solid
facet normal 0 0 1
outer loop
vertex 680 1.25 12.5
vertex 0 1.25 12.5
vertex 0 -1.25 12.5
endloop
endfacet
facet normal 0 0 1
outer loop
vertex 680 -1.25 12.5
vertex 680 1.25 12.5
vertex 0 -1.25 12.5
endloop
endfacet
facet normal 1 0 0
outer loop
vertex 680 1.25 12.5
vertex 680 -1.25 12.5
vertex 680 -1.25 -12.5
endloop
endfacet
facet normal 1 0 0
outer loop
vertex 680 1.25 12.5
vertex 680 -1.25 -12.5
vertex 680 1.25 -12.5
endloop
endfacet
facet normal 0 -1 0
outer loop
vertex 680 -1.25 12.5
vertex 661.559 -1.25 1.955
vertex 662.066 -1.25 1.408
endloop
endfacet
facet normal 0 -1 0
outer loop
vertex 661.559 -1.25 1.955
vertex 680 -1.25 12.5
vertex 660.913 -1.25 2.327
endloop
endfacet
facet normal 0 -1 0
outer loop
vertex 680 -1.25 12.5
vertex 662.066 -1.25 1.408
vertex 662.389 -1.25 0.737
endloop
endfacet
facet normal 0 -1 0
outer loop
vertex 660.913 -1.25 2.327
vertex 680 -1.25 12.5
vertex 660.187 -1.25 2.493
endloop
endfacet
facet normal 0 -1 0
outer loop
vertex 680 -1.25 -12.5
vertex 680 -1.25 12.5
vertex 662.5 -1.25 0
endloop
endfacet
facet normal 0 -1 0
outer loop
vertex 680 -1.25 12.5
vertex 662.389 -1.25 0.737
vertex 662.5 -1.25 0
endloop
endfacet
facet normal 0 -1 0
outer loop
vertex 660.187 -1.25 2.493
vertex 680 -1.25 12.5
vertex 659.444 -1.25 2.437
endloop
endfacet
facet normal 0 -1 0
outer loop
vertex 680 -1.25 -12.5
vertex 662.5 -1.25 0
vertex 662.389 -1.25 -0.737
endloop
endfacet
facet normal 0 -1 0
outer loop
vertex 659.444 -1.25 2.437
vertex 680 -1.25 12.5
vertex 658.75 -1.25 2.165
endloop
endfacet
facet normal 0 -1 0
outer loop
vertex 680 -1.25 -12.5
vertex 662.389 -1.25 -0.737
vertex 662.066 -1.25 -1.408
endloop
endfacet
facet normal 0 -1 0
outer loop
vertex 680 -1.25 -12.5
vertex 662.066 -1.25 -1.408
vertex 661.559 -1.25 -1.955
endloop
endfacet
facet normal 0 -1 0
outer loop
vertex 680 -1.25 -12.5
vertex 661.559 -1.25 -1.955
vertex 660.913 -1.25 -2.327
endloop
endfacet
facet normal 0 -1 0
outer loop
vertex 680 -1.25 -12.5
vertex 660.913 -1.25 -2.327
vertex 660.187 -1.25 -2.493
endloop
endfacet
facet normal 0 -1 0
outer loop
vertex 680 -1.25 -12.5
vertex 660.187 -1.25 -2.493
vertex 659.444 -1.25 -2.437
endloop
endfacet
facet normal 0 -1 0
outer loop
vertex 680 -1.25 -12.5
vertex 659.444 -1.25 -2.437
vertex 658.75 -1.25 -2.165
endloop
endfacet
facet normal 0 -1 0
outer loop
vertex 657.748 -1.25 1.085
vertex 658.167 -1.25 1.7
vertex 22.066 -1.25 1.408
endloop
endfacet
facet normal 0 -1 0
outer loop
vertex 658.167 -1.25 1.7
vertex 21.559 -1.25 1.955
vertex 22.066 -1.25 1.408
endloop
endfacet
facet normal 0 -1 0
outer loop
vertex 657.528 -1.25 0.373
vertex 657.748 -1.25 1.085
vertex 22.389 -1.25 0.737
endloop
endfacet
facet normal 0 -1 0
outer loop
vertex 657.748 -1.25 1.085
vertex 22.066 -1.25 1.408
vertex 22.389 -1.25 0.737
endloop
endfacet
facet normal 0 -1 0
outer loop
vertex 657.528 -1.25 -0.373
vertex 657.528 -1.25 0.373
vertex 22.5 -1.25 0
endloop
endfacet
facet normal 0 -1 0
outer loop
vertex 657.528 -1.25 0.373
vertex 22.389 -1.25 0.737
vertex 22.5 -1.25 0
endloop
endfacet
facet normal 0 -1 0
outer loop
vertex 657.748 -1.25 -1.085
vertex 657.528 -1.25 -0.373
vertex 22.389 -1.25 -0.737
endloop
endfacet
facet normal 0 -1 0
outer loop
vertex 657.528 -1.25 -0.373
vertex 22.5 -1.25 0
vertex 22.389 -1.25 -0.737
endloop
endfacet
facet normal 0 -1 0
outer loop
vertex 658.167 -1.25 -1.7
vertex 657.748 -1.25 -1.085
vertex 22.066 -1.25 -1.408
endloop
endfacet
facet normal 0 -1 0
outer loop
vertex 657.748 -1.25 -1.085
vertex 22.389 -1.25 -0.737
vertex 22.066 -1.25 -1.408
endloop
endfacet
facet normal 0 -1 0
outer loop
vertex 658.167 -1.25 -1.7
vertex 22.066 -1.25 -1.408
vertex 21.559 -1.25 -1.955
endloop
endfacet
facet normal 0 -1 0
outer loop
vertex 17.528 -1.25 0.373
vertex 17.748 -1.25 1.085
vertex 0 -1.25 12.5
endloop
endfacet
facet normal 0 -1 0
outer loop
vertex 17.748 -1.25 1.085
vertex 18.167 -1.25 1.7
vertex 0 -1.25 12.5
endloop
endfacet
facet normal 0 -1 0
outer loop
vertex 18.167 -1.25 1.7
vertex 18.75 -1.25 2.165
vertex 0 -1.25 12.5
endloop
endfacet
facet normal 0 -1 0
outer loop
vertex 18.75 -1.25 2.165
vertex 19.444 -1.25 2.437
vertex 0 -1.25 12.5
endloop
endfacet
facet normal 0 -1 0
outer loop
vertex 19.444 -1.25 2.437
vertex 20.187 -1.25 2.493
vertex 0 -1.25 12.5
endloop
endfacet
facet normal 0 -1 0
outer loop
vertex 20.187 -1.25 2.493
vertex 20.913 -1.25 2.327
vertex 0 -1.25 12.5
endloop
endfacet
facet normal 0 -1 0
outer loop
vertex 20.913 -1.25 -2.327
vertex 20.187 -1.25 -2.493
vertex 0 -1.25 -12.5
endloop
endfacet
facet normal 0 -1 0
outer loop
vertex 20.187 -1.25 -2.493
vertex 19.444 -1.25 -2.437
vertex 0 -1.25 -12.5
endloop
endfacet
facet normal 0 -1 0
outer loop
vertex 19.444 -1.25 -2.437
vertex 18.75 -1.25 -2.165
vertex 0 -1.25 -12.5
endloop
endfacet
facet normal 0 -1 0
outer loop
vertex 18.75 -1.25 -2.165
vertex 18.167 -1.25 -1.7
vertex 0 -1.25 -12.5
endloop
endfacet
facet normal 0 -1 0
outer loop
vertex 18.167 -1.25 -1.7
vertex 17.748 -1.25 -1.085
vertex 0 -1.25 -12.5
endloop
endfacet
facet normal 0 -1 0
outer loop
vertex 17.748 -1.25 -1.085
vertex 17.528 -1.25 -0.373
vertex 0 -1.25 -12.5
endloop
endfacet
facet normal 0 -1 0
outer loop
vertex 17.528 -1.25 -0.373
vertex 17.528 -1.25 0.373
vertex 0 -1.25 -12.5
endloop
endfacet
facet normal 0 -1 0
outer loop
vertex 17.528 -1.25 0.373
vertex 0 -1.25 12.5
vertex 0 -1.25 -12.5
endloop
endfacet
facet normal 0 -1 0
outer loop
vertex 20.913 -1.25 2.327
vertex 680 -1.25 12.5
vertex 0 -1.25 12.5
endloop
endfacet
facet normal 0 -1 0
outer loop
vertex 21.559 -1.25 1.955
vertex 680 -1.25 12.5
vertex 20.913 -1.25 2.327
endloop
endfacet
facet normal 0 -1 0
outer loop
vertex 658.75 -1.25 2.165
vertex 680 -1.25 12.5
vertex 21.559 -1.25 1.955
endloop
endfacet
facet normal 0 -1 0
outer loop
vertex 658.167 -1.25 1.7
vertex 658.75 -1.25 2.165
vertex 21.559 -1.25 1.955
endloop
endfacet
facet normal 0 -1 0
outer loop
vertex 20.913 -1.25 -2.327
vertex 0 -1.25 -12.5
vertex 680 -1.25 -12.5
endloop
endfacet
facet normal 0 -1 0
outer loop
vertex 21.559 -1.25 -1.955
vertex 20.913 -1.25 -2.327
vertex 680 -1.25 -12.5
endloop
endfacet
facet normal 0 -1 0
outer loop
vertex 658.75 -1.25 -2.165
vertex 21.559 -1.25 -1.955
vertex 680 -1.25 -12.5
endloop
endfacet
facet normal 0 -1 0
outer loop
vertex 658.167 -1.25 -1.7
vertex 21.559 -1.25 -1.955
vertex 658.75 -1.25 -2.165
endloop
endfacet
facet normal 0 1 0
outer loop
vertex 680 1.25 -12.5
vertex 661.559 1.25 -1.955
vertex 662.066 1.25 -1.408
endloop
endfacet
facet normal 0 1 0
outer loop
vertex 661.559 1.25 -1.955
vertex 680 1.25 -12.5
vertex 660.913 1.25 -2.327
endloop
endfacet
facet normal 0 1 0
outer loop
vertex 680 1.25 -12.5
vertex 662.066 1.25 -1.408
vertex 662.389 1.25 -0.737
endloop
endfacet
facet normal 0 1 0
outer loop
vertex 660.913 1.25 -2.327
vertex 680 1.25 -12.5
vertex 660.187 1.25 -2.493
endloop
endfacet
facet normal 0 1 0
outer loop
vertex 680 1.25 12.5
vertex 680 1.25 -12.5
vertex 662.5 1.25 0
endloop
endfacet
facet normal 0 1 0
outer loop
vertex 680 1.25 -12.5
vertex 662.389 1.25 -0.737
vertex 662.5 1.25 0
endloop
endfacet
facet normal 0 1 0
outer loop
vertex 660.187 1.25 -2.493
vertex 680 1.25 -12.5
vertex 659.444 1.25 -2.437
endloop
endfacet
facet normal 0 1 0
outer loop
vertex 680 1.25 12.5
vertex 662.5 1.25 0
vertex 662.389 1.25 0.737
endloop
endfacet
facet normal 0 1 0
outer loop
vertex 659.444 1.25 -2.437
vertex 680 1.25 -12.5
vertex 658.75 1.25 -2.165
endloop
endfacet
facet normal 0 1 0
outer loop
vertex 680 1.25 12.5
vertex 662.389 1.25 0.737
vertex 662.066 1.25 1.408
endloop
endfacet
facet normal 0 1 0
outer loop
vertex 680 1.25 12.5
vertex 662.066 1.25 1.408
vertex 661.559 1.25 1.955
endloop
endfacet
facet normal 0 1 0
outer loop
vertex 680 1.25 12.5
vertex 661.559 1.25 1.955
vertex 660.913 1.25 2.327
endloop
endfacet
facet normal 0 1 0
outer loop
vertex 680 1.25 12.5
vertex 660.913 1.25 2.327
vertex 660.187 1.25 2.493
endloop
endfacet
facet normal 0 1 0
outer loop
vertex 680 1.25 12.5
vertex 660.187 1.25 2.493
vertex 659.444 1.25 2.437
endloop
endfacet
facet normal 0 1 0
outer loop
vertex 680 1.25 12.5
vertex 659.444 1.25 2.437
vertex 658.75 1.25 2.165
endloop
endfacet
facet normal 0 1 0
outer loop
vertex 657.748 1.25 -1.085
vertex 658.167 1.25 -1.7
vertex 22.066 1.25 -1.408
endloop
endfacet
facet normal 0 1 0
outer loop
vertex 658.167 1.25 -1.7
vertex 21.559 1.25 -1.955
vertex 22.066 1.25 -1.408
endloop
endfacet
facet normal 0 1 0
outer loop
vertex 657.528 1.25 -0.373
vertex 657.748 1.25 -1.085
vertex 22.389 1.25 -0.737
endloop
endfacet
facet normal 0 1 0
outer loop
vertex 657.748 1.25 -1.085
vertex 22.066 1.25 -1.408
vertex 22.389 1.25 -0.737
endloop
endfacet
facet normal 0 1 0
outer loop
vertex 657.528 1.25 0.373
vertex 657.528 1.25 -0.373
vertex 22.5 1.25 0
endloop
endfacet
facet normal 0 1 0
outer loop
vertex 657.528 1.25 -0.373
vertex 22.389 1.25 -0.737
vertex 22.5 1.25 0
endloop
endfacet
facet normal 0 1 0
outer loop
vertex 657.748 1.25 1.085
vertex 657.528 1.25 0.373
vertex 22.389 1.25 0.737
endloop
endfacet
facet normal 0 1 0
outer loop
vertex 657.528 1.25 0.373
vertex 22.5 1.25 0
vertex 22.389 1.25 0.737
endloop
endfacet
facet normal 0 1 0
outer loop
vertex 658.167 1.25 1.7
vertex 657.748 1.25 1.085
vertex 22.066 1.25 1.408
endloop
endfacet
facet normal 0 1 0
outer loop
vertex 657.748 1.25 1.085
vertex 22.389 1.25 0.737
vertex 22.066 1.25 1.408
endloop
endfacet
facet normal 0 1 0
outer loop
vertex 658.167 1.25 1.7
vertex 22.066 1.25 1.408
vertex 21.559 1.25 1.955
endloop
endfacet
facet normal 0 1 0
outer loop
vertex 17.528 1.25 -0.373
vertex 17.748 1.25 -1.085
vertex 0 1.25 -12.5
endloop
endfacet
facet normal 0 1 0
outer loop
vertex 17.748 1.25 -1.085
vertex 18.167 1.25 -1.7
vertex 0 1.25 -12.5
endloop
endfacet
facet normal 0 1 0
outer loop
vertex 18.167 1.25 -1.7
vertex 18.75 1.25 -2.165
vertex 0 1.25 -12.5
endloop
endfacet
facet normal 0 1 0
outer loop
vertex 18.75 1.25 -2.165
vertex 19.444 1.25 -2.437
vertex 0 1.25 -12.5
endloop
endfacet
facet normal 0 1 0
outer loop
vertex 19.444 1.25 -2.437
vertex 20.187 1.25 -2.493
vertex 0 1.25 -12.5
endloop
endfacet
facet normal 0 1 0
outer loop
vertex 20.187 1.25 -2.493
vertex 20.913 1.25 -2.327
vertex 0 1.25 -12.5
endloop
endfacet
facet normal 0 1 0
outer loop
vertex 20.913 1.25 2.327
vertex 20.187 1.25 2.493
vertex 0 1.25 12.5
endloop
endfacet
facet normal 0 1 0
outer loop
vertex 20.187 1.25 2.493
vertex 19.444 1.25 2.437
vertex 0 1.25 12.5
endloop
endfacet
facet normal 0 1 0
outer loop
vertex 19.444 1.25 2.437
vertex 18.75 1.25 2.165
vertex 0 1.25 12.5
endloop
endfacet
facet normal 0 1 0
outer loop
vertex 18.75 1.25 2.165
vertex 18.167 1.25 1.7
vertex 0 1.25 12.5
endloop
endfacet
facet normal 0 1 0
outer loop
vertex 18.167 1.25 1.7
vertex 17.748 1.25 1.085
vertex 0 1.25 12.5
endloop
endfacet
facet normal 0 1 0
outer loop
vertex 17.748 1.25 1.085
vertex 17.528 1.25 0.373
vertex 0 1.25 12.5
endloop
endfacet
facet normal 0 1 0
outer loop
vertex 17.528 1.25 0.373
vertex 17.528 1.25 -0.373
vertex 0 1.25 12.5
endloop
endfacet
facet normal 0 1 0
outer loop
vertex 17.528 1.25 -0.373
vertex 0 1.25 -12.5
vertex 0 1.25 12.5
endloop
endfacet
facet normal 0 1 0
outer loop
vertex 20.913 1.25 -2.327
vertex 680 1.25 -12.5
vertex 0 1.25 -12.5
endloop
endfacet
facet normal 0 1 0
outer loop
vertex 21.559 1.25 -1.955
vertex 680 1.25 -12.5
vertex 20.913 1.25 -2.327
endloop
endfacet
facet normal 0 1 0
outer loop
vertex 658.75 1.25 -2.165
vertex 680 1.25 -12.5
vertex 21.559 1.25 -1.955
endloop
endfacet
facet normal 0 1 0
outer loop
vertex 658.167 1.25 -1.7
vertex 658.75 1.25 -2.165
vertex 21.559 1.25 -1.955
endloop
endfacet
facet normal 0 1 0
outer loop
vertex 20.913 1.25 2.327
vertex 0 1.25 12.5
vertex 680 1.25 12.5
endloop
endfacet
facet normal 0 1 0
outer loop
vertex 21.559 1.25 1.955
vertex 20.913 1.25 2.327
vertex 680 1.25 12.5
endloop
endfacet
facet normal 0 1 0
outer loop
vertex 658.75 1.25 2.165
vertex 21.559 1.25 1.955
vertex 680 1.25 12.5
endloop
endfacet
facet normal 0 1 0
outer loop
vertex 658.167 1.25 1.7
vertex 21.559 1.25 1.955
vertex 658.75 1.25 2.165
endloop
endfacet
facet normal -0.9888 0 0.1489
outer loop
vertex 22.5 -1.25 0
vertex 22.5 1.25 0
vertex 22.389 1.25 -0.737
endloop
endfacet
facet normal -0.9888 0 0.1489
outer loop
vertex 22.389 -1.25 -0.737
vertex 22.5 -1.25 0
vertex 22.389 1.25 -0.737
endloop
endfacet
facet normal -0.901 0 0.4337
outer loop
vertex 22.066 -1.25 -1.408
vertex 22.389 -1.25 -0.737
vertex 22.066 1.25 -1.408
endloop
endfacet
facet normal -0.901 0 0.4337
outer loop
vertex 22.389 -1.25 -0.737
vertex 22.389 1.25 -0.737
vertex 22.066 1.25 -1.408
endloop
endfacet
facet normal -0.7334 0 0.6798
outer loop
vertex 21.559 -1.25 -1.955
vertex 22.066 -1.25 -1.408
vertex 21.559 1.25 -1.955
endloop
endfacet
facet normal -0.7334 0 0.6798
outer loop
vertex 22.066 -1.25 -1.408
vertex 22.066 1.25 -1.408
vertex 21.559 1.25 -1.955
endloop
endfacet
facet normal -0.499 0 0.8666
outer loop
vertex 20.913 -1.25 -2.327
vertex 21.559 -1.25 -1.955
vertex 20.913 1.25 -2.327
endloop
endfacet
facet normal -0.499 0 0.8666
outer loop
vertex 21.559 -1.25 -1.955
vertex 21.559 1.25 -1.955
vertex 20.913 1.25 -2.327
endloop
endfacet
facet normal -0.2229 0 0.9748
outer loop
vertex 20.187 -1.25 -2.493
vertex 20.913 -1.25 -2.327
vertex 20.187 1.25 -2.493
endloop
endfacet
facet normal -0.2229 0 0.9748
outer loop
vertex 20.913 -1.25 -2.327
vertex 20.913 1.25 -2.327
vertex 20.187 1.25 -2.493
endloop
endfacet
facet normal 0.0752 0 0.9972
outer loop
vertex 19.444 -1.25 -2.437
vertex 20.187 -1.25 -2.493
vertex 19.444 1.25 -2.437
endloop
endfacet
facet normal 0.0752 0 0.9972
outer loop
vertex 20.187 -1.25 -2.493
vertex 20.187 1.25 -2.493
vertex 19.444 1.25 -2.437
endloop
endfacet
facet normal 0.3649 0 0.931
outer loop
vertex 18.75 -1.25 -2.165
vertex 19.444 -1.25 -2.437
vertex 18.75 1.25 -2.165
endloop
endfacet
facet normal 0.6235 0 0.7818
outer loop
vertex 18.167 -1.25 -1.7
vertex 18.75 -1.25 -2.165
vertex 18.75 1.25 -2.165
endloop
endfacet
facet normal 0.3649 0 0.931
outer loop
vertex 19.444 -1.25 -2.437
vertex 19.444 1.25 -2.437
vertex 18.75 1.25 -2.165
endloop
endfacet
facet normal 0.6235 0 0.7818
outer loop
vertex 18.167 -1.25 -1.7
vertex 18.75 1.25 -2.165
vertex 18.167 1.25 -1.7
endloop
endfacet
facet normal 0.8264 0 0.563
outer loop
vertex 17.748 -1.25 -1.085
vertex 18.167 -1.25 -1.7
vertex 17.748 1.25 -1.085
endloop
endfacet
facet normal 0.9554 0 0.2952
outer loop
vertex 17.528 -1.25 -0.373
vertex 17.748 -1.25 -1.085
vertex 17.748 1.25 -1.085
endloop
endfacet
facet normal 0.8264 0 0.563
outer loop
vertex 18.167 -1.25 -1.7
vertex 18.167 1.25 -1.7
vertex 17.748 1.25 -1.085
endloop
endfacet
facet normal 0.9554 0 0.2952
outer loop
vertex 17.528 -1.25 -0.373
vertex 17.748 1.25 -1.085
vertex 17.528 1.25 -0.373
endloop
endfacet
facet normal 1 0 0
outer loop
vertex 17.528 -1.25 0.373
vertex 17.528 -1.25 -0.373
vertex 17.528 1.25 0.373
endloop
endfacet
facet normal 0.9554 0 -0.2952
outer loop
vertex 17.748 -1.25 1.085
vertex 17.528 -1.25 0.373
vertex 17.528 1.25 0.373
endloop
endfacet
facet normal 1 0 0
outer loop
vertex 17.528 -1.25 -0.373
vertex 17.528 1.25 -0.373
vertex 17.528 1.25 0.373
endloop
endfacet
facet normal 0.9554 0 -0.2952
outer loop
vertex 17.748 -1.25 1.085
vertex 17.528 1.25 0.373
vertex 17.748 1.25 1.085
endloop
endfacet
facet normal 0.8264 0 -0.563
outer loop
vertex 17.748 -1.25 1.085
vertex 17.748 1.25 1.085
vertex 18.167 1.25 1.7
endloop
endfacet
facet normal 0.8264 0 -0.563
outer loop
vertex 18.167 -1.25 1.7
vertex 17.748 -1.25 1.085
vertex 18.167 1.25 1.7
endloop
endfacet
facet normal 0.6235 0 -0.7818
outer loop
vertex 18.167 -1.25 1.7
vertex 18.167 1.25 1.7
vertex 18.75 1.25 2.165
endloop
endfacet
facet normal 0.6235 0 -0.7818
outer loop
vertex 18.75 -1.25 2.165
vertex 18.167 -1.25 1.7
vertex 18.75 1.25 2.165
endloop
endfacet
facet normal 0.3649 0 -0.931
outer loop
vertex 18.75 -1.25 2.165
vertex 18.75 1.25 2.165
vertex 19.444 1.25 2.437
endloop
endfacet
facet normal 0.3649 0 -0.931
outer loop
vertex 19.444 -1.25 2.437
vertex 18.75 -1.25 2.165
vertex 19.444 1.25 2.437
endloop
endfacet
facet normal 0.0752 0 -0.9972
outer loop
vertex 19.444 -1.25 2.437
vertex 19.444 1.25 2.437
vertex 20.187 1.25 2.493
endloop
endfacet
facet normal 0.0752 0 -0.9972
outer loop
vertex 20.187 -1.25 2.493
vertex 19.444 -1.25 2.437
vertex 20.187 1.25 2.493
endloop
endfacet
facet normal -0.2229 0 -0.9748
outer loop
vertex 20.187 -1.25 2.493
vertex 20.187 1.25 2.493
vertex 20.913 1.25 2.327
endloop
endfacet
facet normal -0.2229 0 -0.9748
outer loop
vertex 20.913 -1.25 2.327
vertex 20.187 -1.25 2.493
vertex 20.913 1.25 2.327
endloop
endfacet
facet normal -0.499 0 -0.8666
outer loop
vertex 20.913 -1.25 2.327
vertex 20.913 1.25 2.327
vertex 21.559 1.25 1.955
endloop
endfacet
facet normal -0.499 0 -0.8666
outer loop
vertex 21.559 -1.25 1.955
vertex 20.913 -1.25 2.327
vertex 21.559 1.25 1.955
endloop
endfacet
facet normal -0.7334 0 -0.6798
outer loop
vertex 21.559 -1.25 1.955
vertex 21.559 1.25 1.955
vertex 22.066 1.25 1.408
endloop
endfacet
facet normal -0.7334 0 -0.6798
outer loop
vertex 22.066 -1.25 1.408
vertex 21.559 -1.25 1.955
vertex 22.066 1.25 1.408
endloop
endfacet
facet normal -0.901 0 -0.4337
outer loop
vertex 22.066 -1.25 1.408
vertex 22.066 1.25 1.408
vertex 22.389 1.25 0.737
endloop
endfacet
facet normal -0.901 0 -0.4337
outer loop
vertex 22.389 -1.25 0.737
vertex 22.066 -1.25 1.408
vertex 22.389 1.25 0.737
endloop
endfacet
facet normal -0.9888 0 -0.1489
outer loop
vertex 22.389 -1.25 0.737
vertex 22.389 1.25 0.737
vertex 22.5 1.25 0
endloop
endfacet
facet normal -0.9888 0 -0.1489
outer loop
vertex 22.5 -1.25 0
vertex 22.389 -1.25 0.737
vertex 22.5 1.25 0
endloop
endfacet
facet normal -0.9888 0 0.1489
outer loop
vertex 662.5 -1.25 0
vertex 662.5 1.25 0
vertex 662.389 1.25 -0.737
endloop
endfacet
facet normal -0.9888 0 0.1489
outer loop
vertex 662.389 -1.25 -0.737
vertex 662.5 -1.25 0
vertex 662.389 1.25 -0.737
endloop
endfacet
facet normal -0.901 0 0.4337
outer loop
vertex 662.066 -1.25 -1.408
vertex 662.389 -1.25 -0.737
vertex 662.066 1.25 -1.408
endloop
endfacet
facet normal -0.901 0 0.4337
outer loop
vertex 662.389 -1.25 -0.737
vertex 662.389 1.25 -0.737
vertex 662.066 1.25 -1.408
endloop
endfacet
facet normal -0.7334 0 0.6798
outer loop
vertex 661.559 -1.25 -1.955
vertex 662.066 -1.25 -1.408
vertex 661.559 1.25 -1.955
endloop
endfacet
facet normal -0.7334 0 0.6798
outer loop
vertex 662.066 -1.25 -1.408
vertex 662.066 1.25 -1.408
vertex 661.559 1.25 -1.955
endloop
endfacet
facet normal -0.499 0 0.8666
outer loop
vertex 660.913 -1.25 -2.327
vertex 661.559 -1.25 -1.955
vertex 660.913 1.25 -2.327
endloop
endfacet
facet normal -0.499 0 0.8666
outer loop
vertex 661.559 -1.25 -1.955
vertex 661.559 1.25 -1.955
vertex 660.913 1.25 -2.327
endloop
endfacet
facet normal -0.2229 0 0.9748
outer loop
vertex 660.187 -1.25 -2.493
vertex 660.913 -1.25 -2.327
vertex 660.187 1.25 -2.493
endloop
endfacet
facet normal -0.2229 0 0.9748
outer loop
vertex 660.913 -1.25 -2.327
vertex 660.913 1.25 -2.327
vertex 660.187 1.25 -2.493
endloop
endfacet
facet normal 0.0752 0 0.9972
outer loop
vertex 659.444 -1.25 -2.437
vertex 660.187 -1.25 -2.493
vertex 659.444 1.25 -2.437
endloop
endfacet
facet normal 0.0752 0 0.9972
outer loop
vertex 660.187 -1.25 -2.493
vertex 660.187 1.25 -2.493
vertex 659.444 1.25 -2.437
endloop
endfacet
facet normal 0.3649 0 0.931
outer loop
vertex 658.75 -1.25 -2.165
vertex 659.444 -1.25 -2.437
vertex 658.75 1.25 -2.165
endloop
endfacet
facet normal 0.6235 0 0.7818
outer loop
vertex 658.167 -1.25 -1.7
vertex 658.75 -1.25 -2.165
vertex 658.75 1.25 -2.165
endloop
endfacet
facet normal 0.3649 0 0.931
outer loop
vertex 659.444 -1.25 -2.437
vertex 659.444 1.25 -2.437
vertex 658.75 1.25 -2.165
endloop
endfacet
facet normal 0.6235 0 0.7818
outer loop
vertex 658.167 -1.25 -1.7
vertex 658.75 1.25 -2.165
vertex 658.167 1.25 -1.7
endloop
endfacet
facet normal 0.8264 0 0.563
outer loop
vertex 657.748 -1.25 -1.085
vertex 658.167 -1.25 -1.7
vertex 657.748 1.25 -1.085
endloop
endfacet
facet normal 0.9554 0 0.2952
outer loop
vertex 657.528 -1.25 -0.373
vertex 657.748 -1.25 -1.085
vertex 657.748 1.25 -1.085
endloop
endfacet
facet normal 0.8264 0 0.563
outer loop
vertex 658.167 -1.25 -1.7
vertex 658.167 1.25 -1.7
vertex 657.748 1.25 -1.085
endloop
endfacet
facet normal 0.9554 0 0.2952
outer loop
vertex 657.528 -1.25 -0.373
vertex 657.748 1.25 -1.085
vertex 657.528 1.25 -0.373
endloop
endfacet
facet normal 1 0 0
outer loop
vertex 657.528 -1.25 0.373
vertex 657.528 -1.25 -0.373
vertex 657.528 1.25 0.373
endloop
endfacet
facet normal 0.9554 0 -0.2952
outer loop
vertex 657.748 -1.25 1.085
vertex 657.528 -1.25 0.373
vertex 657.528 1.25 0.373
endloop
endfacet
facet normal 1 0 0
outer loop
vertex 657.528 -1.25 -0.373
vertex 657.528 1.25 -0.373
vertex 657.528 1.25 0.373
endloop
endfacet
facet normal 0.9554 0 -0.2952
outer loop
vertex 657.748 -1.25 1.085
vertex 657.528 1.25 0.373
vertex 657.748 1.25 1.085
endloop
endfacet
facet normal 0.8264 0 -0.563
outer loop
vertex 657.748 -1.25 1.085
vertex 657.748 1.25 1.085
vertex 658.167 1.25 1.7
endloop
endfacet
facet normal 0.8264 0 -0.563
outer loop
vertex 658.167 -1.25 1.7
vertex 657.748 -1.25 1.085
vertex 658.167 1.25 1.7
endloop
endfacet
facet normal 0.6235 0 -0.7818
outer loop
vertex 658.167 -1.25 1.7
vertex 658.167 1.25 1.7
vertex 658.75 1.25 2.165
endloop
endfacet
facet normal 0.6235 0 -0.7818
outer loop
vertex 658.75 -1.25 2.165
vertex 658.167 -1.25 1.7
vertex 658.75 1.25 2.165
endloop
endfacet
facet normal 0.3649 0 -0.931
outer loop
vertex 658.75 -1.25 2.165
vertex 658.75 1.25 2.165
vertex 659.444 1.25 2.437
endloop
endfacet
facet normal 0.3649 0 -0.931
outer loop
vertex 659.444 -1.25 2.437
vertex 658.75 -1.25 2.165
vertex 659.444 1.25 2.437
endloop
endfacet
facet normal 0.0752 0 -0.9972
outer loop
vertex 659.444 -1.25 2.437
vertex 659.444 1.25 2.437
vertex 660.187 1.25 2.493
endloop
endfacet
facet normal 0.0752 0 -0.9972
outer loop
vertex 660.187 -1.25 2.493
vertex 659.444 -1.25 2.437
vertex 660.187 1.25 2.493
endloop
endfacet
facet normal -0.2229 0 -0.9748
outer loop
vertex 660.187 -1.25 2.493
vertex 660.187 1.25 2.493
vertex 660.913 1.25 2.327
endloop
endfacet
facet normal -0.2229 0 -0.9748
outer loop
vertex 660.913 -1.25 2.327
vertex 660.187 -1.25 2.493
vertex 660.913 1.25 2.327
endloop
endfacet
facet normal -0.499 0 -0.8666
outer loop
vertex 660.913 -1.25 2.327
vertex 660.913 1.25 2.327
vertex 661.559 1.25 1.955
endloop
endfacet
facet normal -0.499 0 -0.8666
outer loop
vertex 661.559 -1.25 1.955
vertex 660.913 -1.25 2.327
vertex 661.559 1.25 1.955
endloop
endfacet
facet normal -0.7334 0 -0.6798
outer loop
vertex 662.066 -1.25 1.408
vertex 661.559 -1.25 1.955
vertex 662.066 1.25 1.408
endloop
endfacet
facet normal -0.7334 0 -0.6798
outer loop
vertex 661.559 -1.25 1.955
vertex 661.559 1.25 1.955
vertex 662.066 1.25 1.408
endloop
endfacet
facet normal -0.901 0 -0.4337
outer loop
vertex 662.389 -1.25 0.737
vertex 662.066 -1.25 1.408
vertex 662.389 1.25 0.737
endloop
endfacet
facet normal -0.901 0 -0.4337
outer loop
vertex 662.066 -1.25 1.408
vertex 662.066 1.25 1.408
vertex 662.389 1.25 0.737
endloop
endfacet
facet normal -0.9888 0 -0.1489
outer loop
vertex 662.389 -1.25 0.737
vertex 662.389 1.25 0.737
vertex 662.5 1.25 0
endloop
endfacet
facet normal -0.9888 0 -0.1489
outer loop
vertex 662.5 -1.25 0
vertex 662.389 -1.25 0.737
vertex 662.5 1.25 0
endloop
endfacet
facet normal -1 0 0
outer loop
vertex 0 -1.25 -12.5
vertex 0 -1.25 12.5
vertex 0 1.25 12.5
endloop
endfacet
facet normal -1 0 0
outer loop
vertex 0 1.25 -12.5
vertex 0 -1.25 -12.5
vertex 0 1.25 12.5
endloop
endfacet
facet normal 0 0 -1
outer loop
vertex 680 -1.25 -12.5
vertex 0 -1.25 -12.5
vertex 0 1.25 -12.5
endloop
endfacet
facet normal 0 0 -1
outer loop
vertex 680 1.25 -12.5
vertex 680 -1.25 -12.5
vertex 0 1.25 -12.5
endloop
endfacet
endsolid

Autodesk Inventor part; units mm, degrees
ref_plane "YZ Plane" through (0, 0, 0) normal (1, 0, 0) x (0, 1, 0)
ref_plane "XZ Plane" through (0, 0, 0) normal (0, 1, 0) x (-1, 0, 0)
ref_plane "XY Plane" through (0, 0, 0) normal (0, 0, 1) x (1, 0, 0)
sketch "Sketch1" plane through (0, 0, 0) normal (1, 0, 0) x (0, 1, 0)
  line L0 (1.25, 12.5) -> (-1.25, 12.5)
  line L1 (-1.25, 12.5) -> (-1.25, -12.5)
  line L2 (-1.25, -12.5) -> (1.25, -12.5)
  line L3 (1.25, -12.5) -> (1.25, 12.5)
  line L4 (1.25, 12.5) -> (-1.25, -12.5) construction
  line L5 (-1.25, 12.5) -> (1.25, -12.5) construction
  point P0 (0, 0)
  dimension "d0" = 2.5
  dimension "d1" = 25
extrude "Extrusion1" add sketch "Sketch1" along normal blind 680
sketch "Sketch2" plane through (0, 1.25, 12.5) normal (0, 1, 0) x (1, 0, 0)
  line L0 (0, 12.5) -> (20, 12.5)
  line L1 (20, 12.5) -> (660, 12.5)
  circle A0 centre (20, 12.5) radius 2.5
  circle A1 centre (660, 12.5) radius 2.5
  dimension "d4" = 20
  dimension "d5" = 640
  dimension "d6" = 5
  dimension "d7" = 5
extrude "Extrusion2" cut sketch "Sketch2" against normal blind 680
properties part number "PLETINA PARA GUIA CILINDRICA"
